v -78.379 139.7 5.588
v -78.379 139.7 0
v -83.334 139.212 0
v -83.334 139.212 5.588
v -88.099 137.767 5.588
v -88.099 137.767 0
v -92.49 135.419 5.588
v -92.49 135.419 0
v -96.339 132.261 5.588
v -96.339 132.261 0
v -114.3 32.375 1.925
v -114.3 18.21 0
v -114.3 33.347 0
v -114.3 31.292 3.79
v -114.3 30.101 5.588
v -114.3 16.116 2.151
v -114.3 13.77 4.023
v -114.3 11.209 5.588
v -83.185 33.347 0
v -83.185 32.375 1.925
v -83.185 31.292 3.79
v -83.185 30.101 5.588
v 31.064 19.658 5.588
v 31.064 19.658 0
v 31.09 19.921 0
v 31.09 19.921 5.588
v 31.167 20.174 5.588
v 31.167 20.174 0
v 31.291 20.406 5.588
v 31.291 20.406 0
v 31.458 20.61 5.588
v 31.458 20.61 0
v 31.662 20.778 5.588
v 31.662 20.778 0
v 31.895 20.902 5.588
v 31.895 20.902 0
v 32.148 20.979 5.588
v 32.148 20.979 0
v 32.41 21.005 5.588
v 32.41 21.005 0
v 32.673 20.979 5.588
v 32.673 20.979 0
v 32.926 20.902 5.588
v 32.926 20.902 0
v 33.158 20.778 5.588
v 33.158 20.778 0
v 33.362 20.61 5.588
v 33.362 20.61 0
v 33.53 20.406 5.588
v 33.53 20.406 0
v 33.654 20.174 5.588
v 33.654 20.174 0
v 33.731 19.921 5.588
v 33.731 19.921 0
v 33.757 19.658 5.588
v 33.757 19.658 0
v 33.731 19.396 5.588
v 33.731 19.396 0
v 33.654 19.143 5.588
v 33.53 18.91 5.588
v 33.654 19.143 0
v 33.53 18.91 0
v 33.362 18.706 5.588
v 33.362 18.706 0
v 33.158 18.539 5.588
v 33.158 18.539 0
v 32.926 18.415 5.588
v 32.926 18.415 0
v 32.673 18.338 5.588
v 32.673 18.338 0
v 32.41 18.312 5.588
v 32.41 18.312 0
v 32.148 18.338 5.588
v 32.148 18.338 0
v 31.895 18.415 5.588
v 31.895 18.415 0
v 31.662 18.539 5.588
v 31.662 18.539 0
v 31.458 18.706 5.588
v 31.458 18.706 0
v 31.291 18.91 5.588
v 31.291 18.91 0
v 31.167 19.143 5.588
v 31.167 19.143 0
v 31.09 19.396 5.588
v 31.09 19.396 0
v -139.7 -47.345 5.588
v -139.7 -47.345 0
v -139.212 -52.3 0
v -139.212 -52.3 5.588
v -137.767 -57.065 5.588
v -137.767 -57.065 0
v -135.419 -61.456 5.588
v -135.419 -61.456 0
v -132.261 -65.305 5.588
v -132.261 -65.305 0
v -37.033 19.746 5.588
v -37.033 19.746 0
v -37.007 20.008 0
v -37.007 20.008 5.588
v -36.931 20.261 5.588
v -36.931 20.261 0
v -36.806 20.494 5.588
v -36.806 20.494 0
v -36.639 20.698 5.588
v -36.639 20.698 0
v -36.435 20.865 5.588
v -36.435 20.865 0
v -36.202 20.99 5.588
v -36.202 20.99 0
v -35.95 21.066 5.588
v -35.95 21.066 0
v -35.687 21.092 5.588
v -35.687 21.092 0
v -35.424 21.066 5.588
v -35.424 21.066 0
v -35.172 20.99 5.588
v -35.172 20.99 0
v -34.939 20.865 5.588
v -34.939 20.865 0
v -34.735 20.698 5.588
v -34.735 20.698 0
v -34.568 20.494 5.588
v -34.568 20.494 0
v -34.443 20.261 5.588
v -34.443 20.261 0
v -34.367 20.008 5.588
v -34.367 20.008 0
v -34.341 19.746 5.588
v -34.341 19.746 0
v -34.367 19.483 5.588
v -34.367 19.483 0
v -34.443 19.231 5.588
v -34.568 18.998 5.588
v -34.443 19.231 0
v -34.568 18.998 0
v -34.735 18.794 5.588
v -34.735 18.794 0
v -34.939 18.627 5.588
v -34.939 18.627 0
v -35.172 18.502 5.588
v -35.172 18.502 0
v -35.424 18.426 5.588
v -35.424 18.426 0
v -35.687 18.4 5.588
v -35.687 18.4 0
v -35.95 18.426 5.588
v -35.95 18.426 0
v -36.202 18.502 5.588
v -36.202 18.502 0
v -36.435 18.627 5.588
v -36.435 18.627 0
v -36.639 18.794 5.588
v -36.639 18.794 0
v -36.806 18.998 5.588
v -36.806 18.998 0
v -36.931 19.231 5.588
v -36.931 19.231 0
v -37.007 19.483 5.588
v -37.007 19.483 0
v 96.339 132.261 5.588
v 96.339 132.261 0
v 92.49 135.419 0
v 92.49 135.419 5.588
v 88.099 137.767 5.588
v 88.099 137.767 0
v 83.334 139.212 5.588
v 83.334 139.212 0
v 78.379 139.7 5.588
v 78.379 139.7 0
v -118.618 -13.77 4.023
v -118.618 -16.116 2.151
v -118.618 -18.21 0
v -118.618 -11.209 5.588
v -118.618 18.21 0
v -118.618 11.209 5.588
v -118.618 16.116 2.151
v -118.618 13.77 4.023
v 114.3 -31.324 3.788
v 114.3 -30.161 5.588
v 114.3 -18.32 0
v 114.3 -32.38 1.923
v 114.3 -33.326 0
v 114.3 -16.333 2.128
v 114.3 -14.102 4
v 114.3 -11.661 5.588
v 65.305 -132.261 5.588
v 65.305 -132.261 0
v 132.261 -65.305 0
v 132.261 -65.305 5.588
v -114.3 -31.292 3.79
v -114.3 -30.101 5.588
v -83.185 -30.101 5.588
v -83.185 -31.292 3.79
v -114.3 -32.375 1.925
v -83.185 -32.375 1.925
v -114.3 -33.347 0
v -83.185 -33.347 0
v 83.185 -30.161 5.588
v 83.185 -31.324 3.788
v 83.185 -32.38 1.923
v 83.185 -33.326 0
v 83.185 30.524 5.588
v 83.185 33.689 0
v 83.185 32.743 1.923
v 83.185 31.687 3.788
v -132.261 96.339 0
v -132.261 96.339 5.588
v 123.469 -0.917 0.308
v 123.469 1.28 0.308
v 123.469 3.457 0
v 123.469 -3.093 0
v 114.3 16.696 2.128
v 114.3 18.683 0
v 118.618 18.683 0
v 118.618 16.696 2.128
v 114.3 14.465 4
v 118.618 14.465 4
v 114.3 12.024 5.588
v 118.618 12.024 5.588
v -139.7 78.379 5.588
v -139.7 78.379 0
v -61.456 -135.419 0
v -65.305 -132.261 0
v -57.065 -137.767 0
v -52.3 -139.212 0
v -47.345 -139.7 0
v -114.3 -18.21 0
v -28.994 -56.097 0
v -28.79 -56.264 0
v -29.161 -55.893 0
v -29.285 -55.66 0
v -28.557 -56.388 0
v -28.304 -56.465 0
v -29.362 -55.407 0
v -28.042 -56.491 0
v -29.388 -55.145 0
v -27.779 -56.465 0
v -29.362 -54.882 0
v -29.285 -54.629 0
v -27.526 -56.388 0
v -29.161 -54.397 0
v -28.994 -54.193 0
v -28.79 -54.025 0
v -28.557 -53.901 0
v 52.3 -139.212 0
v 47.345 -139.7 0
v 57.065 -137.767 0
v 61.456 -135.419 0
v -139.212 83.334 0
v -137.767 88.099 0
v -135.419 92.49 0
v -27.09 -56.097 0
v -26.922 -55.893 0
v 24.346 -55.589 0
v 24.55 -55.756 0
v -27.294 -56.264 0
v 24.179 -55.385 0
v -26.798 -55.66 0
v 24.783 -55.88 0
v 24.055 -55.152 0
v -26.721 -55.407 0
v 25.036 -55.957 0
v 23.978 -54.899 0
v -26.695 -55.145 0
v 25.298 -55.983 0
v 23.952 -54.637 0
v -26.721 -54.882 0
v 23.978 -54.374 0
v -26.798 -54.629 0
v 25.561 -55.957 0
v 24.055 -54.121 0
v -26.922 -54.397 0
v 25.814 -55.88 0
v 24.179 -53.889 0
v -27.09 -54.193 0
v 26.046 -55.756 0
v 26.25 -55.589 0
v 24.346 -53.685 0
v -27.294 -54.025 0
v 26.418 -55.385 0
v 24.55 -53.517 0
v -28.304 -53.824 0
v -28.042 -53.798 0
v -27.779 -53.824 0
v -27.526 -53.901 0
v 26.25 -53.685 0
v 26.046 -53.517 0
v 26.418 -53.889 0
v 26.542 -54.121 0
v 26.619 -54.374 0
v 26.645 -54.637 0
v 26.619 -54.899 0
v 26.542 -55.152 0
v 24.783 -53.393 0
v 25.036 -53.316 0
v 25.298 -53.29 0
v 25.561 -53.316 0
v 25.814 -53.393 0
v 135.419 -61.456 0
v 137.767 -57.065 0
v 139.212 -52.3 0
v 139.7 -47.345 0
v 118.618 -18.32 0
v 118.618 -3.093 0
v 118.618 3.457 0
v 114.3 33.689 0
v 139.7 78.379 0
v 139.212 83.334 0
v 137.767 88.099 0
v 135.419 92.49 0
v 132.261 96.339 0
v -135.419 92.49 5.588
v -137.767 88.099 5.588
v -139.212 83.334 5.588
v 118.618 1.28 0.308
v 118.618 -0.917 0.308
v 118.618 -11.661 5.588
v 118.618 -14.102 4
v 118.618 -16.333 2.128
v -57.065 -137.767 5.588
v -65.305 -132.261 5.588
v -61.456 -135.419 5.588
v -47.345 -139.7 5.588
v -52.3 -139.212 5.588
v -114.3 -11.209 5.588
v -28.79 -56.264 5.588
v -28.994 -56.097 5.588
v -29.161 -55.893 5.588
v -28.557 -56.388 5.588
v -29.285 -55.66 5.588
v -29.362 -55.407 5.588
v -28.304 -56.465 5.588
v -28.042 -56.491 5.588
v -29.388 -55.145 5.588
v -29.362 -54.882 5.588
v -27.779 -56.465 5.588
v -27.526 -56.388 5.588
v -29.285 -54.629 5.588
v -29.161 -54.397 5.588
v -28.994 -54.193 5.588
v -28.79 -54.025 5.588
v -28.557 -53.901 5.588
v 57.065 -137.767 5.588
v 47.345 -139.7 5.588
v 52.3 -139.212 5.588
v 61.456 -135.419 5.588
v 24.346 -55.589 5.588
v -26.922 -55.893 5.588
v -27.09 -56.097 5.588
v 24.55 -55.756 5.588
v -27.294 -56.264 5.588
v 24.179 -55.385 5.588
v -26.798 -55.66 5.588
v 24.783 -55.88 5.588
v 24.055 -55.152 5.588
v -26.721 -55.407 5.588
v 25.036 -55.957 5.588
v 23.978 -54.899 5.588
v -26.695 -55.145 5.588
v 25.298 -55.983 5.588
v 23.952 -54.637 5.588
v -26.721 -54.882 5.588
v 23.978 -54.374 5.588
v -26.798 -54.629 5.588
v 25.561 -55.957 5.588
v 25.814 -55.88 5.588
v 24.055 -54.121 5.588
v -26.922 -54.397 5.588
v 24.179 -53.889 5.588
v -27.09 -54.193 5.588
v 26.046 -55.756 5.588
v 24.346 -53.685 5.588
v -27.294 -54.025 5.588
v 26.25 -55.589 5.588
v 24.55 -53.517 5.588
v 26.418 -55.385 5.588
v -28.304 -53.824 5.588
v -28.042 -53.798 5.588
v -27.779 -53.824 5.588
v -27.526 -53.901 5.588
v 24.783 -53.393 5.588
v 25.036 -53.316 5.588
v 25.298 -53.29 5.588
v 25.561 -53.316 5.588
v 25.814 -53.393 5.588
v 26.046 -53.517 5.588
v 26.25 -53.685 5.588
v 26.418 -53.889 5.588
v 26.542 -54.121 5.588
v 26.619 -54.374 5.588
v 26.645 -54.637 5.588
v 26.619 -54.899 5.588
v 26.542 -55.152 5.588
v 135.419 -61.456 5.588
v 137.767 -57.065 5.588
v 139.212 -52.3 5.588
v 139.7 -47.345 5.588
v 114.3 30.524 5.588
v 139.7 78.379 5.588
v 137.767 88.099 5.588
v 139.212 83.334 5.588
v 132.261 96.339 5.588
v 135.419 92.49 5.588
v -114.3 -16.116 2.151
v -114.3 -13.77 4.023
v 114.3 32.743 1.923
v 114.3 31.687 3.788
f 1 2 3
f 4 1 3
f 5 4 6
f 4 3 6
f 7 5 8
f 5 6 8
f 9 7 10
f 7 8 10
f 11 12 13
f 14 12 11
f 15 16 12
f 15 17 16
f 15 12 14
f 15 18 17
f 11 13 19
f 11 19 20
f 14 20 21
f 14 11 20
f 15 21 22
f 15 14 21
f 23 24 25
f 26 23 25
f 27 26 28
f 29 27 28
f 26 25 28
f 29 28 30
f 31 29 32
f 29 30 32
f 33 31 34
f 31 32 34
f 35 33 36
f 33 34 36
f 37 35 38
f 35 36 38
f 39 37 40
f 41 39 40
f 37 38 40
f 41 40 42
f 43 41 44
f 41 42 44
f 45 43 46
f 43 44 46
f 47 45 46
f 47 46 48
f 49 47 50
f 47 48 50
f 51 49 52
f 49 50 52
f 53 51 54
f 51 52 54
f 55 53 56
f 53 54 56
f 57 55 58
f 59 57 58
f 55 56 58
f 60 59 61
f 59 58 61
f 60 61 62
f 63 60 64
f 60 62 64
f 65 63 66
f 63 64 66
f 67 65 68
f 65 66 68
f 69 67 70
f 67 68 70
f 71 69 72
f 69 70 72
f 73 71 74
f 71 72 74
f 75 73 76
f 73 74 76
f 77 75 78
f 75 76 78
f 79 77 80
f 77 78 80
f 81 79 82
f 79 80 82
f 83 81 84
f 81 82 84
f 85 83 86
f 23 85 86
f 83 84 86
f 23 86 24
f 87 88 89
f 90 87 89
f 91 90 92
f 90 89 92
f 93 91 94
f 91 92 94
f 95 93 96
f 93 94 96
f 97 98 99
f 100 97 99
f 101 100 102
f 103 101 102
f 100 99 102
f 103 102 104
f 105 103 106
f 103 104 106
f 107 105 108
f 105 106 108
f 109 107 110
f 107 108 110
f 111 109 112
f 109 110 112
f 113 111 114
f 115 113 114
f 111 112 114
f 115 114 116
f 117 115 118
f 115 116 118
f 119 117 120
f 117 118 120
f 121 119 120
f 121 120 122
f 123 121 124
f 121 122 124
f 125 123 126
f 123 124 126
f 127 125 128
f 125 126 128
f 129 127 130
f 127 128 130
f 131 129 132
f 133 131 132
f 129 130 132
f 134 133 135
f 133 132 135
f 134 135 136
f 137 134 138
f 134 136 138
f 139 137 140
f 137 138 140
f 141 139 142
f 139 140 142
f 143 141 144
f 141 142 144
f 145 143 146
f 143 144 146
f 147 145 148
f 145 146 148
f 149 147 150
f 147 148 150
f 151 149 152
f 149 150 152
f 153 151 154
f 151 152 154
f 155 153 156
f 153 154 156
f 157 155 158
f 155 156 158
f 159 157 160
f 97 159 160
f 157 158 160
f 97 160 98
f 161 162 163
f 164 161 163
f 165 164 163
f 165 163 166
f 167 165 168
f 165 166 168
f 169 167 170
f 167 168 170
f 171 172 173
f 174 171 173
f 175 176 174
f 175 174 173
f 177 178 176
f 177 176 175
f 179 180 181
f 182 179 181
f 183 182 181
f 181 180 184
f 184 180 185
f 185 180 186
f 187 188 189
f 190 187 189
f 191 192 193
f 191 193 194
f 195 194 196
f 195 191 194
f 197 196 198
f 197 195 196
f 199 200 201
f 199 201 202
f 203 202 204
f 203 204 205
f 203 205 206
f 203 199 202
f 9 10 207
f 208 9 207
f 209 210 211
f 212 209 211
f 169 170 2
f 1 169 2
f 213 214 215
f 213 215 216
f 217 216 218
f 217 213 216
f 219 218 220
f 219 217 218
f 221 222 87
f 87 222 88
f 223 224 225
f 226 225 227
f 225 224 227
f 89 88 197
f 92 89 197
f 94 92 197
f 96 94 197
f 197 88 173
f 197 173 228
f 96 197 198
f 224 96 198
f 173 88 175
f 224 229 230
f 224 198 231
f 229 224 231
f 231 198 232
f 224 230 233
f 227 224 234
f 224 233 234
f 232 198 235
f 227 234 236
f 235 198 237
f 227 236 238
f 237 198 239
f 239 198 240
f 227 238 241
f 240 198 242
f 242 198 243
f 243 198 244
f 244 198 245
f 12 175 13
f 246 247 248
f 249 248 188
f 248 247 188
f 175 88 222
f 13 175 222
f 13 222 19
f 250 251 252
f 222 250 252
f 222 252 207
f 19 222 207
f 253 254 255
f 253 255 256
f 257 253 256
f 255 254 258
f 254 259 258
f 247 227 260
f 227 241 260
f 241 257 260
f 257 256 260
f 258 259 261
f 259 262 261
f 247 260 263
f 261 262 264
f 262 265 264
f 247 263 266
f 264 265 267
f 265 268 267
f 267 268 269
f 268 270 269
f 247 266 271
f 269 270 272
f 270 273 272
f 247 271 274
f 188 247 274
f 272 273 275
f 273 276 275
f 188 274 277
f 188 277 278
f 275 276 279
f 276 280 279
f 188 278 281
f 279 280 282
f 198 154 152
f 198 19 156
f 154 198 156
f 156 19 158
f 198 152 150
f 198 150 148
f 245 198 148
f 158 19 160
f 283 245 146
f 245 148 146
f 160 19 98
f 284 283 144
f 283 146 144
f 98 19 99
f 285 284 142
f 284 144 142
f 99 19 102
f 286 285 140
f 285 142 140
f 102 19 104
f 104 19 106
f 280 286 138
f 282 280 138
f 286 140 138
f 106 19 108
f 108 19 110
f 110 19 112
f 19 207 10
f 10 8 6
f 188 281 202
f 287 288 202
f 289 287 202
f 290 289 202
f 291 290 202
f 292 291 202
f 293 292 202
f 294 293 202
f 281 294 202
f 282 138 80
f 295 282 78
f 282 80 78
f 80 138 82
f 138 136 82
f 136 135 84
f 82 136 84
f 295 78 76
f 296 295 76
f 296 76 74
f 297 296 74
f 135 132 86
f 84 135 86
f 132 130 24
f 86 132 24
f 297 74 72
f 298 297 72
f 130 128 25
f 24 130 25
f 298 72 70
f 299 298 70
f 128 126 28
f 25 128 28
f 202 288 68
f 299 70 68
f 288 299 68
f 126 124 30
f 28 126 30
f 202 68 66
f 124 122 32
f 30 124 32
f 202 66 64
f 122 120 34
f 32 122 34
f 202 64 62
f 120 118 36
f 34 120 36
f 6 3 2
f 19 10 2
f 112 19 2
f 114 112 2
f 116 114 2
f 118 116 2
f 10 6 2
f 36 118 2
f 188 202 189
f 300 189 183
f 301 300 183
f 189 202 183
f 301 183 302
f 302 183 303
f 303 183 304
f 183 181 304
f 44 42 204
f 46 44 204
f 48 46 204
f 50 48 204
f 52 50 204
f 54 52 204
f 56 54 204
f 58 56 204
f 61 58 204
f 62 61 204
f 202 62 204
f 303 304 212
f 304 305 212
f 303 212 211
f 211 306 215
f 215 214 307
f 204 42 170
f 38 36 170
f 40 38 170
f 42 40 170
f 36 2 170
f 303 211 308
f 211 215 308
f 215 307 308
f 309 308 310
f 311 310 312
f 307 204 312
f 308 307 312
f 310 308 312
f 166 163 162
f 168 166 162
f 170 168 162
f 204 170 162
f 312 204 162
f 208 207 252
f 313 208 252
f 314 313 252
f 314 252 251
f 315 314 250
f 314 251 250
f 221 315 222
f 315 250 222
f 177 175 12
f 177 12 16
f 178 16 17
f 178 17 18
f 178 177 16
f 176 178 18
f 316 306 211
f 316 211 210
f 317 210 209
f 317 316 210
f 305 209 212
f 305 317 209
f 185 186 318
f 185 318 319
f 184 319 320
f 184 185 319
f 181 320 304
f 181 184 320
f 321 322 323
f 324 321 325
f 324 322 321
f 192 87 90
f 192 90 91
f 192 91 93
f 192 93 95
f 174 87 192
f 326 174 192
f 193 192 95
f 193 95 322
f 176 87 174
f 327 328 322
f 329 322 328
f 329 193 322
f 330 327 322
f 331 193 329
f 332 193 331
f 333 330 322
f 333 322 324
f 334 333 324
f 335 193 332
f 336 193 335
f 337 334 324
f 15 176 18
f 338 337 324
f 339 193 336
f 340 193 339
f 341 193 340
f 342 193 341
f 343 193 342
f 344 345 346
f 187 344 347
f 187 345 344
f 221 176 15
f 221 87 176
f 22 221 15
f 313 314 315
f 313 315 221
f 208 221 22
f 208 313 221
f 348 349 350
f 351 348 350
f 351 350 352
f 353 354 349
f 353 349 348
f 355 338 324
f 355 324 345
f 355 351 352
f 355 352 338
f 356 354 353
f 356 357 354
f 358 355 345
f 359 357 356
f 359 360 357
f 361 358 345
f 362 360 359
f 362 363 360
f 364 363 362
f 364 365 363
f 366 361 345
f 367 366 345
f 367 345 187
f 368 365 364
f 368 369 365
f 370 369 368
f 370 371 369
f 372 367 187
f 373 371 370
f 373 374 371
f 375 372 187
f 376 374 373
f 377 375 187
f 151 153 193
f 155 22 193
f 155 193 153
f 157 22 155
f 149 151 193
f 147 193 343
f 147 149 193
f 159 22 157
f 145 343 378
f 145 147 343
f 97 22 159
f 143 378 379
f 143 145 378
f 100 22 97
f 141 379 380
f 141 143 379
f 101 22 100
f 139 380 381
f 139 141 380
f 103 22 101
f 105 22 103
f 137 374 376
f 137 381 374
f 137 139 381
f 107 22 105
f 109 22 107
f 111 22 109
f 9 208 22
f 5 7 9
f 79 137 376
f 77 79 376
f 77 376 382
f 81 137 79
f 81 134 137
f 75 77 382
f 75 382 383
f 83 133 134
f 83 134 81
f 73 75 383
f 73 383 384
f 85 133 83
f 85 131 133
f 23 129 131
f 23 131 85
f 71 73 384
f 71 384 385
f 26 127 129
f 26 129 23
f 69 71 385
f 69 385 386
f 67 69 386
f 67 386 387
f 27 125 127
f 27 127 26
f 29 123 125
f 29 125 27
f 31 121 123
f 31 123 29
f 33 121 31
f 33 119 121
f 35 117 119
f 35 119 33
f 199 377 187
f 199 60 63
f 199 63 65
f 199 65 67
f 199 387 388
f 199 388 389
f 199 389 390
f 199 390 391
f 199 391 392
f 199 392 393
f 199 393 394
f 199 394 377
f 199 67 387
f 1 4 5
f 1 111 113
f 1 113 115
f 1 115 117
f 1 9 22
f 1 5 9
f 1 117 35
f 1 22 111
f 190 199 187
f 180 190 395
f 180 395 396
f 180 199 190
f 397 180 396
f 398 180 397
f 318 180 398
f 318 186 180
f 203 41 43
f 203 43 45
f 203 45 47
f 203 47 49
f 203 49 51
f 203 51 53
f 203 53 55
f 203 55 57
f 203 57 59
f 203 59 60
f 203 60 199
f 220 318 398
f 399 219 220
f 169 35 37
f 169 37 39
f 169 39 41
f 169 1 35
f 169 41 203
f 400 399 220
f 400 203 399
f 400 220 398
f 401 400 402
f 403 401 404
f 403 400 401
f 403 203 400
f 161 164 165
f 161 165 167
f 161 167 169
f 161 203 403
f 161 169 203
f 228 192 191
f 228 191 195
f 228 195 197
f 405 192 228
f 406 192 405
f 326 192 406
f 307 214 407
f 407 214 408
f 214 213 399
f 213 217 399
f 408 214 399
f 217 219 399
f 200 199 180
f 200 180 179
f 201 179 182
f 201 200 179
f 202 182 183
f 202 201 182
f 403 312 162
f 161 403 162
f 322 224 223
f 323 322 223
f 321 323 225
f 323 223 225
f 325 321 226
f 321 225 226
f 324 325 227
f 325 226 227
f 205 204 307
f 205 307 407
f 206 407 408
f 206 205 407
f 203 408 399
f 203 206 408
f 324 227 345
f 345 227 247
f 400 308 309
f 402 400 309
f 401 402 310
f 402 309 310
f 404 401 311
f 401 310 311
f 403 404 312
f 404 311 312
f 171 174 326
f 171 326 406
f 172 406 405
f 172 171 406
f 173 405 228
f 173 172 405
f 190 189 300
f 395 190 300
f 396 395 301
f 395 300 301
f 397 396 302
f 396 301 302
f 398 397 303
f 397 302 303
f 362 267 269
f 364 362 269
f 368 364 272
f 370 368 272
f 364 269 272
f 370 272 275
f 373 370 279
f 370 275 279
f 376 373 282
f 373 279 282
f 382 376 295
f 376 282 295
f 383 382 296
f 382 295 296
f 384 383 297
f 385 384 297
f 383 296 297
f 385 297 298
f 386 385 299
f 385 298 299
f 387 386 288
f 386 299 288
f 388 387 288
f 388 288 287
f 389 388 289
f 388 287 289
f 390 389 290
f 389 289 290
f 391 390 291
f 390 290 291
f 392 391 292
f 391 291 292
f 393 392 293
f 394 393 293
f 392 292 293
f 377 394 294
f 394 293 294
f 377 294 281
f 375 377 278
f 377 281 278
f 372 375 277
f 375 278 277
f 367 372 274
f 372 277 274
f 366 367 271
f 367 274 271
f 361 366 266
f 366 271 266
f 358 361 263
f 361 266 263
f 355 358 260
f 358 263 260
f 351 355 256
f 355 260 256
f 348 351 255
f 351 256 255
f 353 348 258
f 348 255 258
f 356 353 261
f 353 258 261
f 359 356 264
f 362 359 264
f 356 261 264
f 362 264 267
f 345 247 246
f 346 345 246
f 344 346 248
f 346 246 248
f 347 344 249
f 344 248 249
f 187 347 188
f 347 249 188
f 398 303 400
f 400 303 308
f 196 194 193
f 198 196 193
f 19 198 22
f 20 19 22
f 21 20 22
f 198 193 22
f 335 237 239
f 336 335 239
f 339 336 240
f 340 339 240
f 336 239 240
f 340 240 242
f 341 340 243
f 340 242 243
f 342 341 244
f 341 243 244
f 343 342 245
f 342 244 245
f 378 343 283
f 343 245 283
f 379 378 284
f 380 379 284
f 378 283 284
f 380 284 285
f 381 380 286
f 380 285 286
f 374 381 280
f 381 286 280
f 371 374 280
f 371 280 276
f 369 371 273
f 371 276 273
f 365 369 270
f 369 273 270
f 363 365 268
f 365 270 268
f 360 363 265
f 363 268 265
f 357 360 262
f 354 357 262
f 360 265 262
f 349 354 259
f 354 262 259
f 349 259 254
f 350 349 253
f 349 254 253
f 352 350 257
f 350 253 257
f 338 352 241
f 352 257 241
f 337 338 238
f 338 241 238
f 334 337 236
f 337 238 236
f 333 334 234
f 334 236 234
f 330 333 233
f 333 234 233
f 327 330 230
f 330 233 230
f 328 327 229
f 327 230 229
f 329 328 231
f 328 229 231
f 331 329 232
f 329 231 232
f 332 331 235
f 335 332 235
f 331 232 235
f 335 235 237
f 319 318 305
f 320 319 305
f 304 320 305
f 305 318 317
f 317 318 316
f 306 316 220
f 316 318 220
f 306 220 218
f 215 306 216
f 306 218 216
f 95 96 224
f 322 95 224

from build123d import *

# Parameters (mm, degrees)
BOSS_EXTRUDE1_DEPTH = 5.588
SKETCH3_R           = 1.3462
CUT_EXTRUDE2_DEPTH  = 5.588
CAVITY1_START       = 83.185
CAVITY1_DEPTH       = 31.115
CAVITY1_START_2     = -114.3
CAVITY1_2_DEPTH     = 31.115
CAVITY1_START_3     = 114.3
CAVITY1_3_DEPTH     = 4.318
CAVITY1_START_4     = -118.618
CAVITY1_4_DEPTH     = 4.318
CAVITY1_START_5     = 118.618
CAVITY1_5_DEPTH     = 4.8514


# Read off the part's stored shape, not the designer's step: Cavity1
with BuildPart() as part:
    # Sketch1 → Boss-Extrude1 (new body)
    with BuildSketch(Plane.XY):
        with BuildLine():
            Line((65.305122421, -132.260512242), (132.260512242, -65.305122421))
            ThreePointArc((132.260512242, -65.305122421), (137.766540126, -57.064769361), (139.7, -47.344610179))
            Line((139.7, -47.344610179), (139.7, 78.378975516))
            ThreePointArc((139.7, 78.378975516), (137.766540126, 88.099134698), (132.260512242, 96.339487758))
            Line((132.260512242, 96.339487758), (96.339487758, 132.260512242))
            ThreePointArc((96.339487758, 132.260512242), (88.099134698, 137.766540126), (78.378975516, 139.7))
            Line((78.378975516, 139.7), (-78.378975516, 139.7))
            ThreePointArc((-78.378975516, 139.7), (-88.099134698, 137.766540126), (-96.339487758, 132.260512242))
            Line((-96.339487758, 132.260512242), (-132.260512242, 96.339487758))
            ThreePointArc((-132.260512242, 96.339487758), (-137.766540126, 88.099134698), (-139.7, 78.378975516))
            Line((-139.7, 78.378975516), (-139.7, -47.344610179))
            ThreePointArc((-139.7, -47.344610179), (-137.766540126, -57.064769361), (-132.260512242, -65.305122421))
            Line((-132.260512242, -65.305122421), (-65.305122421, -132.260512242))
            ThreePointArc((-65.305122421, -132.260512242), (-57.064769361, -137.766540126), (-47.344610179, -139.7))
            Line((-47.344610179, -139.7), (47.344610179, -139.7))
            ThreePointArc((47.344610179, -139.7), (57.064769361, -137.766540126), (65.305122421, -132.260512242))
        make_face()
    extrude(amount=BOSS_EXTRUDE1_DEPTH)

    # Sketch3 → Cut-Extrude2 (cut)
    with BuildSketch(Plane(origin=(0, 0, 0), x_dir=(-1, 0, 0), z_dir=(0, 0, -1))):
        with Locations((-32.4104, 19.658336728)):
            Circle(SKETCH3_R)
        with Locations((35.687, 19.745836517)):
            Circle(SKETCH3_R)
        with Locations((28.0416, -55.144663272)):
            Circle(SKETCH3_R)
        with Locations((-25.2984, -54.636663272)):
            Circle(SKETCH3_R)
    extrude(amount=-CUT_EXTRUDE2_DEPTH, mode=Mode.SUBTRACT)

    # Cavity1 outline → Cavity1 (cut)
    with BuildSketch(Plane.YZ.offset(CAVITY1_START)):
        with BuildLine():
            ThreePointArc((-30.161375078, 5.588), (-31.865780452, 2.863110305), (-33.326130038, 0))
            Line((-33.326130038, 0), (33.689150844, 0))
            ThreePointArc((33.689150844, 0), (32.228801258, 2.863110305), (30.524395884, 5.588))
            Line((30.524395884, 5.588), (-30.161375078, 5.588))
        make_face()
    extrude(amount=CAVITY1_DEPTH, mode=Mode.SUBTRACT)

    # Cavity1 2 outline → Cavity1 2 (cut)
    with BuildSketch(Plane.YZ.offset(CAVITY1_START_2)):
        with BuildLine():
            Line((-33.347208643, 0), (33.347208643, 0))
            ThreePointArc((33.347208643, 0), (31.84705315, 2.865329857), (30.101301452, 5.588))
            Line((30.101301452, 5.588), (-30.101301452, 5.588))
            ThreePointArc((-30.101301452, 5.588), (-31.84705315, 2.865329857), (-33.347208643, 0))
        make_face()
    extrude(amount=CAVITY1_2_DEPTH, mode=Mode.SUBTRACT)

    # Cavity1 3 outline → Cavity1 3 (cut)
    with BuildSketch(Plane.YZ.offset(CAVITY1_START_3)):
        with BuildLine():
            ThreePointArc((-11.660862641, 5.588), (-15.245647335, 3.098030401), (-18.320194056, 0))
            Line((-18.320194056, 0), (18.683214863, 0))
            ThreePointArc((18.683214863, 0), (15.608668142, 3.098030401), (12.023883447, 5.588))
            Line((12.023883447, 5.588), (-11.660862641, 5.588))
        make_face()
    extrude(amount=CAVITY1_3_DEPTH, mode=Mode.SUBTRACT)

    # Cavity1 4 outline → Cavity1 4 (cut)
    with BuildSketch(Plane.YZ.offset(CAVITY1_START_4)):
        with BuildLine():
            ThreePointArc((-11.208900442, 5.588), (-14.972228516, 3.12349524), (-18.209542122, 0))
            Line((-18.209542122, 0), (18.209542122, 0))
            ThreePointArc((18.209542122, 0), (14.972228516, 3.12349524), (11.208900442, 5.588))
            Line((11.208900442, 5.588), (-11.208900442, 5.588))
        make_face()
    extrude(amount=CAVITY1_4_DEPTH, mode=Mode.SUBTRACT)

    # Cavity1 5 outline → Cavity1 5 (cut)
    with BuildSketch(Plane.YZ.offset(CAVITY1_START_5)):
        with BuildLine():
            ThreePointArc((3.456513242, 0), (0.181510403, 0.346877829), (-3.093492436, 0))
            Line((-3.093492436, 0), (3.456513242, 0))
        make_face()
    extrude(amount=CAVITY1_5_DEPTH, mode=Mode.SUBTRACT)


solid = part.part
